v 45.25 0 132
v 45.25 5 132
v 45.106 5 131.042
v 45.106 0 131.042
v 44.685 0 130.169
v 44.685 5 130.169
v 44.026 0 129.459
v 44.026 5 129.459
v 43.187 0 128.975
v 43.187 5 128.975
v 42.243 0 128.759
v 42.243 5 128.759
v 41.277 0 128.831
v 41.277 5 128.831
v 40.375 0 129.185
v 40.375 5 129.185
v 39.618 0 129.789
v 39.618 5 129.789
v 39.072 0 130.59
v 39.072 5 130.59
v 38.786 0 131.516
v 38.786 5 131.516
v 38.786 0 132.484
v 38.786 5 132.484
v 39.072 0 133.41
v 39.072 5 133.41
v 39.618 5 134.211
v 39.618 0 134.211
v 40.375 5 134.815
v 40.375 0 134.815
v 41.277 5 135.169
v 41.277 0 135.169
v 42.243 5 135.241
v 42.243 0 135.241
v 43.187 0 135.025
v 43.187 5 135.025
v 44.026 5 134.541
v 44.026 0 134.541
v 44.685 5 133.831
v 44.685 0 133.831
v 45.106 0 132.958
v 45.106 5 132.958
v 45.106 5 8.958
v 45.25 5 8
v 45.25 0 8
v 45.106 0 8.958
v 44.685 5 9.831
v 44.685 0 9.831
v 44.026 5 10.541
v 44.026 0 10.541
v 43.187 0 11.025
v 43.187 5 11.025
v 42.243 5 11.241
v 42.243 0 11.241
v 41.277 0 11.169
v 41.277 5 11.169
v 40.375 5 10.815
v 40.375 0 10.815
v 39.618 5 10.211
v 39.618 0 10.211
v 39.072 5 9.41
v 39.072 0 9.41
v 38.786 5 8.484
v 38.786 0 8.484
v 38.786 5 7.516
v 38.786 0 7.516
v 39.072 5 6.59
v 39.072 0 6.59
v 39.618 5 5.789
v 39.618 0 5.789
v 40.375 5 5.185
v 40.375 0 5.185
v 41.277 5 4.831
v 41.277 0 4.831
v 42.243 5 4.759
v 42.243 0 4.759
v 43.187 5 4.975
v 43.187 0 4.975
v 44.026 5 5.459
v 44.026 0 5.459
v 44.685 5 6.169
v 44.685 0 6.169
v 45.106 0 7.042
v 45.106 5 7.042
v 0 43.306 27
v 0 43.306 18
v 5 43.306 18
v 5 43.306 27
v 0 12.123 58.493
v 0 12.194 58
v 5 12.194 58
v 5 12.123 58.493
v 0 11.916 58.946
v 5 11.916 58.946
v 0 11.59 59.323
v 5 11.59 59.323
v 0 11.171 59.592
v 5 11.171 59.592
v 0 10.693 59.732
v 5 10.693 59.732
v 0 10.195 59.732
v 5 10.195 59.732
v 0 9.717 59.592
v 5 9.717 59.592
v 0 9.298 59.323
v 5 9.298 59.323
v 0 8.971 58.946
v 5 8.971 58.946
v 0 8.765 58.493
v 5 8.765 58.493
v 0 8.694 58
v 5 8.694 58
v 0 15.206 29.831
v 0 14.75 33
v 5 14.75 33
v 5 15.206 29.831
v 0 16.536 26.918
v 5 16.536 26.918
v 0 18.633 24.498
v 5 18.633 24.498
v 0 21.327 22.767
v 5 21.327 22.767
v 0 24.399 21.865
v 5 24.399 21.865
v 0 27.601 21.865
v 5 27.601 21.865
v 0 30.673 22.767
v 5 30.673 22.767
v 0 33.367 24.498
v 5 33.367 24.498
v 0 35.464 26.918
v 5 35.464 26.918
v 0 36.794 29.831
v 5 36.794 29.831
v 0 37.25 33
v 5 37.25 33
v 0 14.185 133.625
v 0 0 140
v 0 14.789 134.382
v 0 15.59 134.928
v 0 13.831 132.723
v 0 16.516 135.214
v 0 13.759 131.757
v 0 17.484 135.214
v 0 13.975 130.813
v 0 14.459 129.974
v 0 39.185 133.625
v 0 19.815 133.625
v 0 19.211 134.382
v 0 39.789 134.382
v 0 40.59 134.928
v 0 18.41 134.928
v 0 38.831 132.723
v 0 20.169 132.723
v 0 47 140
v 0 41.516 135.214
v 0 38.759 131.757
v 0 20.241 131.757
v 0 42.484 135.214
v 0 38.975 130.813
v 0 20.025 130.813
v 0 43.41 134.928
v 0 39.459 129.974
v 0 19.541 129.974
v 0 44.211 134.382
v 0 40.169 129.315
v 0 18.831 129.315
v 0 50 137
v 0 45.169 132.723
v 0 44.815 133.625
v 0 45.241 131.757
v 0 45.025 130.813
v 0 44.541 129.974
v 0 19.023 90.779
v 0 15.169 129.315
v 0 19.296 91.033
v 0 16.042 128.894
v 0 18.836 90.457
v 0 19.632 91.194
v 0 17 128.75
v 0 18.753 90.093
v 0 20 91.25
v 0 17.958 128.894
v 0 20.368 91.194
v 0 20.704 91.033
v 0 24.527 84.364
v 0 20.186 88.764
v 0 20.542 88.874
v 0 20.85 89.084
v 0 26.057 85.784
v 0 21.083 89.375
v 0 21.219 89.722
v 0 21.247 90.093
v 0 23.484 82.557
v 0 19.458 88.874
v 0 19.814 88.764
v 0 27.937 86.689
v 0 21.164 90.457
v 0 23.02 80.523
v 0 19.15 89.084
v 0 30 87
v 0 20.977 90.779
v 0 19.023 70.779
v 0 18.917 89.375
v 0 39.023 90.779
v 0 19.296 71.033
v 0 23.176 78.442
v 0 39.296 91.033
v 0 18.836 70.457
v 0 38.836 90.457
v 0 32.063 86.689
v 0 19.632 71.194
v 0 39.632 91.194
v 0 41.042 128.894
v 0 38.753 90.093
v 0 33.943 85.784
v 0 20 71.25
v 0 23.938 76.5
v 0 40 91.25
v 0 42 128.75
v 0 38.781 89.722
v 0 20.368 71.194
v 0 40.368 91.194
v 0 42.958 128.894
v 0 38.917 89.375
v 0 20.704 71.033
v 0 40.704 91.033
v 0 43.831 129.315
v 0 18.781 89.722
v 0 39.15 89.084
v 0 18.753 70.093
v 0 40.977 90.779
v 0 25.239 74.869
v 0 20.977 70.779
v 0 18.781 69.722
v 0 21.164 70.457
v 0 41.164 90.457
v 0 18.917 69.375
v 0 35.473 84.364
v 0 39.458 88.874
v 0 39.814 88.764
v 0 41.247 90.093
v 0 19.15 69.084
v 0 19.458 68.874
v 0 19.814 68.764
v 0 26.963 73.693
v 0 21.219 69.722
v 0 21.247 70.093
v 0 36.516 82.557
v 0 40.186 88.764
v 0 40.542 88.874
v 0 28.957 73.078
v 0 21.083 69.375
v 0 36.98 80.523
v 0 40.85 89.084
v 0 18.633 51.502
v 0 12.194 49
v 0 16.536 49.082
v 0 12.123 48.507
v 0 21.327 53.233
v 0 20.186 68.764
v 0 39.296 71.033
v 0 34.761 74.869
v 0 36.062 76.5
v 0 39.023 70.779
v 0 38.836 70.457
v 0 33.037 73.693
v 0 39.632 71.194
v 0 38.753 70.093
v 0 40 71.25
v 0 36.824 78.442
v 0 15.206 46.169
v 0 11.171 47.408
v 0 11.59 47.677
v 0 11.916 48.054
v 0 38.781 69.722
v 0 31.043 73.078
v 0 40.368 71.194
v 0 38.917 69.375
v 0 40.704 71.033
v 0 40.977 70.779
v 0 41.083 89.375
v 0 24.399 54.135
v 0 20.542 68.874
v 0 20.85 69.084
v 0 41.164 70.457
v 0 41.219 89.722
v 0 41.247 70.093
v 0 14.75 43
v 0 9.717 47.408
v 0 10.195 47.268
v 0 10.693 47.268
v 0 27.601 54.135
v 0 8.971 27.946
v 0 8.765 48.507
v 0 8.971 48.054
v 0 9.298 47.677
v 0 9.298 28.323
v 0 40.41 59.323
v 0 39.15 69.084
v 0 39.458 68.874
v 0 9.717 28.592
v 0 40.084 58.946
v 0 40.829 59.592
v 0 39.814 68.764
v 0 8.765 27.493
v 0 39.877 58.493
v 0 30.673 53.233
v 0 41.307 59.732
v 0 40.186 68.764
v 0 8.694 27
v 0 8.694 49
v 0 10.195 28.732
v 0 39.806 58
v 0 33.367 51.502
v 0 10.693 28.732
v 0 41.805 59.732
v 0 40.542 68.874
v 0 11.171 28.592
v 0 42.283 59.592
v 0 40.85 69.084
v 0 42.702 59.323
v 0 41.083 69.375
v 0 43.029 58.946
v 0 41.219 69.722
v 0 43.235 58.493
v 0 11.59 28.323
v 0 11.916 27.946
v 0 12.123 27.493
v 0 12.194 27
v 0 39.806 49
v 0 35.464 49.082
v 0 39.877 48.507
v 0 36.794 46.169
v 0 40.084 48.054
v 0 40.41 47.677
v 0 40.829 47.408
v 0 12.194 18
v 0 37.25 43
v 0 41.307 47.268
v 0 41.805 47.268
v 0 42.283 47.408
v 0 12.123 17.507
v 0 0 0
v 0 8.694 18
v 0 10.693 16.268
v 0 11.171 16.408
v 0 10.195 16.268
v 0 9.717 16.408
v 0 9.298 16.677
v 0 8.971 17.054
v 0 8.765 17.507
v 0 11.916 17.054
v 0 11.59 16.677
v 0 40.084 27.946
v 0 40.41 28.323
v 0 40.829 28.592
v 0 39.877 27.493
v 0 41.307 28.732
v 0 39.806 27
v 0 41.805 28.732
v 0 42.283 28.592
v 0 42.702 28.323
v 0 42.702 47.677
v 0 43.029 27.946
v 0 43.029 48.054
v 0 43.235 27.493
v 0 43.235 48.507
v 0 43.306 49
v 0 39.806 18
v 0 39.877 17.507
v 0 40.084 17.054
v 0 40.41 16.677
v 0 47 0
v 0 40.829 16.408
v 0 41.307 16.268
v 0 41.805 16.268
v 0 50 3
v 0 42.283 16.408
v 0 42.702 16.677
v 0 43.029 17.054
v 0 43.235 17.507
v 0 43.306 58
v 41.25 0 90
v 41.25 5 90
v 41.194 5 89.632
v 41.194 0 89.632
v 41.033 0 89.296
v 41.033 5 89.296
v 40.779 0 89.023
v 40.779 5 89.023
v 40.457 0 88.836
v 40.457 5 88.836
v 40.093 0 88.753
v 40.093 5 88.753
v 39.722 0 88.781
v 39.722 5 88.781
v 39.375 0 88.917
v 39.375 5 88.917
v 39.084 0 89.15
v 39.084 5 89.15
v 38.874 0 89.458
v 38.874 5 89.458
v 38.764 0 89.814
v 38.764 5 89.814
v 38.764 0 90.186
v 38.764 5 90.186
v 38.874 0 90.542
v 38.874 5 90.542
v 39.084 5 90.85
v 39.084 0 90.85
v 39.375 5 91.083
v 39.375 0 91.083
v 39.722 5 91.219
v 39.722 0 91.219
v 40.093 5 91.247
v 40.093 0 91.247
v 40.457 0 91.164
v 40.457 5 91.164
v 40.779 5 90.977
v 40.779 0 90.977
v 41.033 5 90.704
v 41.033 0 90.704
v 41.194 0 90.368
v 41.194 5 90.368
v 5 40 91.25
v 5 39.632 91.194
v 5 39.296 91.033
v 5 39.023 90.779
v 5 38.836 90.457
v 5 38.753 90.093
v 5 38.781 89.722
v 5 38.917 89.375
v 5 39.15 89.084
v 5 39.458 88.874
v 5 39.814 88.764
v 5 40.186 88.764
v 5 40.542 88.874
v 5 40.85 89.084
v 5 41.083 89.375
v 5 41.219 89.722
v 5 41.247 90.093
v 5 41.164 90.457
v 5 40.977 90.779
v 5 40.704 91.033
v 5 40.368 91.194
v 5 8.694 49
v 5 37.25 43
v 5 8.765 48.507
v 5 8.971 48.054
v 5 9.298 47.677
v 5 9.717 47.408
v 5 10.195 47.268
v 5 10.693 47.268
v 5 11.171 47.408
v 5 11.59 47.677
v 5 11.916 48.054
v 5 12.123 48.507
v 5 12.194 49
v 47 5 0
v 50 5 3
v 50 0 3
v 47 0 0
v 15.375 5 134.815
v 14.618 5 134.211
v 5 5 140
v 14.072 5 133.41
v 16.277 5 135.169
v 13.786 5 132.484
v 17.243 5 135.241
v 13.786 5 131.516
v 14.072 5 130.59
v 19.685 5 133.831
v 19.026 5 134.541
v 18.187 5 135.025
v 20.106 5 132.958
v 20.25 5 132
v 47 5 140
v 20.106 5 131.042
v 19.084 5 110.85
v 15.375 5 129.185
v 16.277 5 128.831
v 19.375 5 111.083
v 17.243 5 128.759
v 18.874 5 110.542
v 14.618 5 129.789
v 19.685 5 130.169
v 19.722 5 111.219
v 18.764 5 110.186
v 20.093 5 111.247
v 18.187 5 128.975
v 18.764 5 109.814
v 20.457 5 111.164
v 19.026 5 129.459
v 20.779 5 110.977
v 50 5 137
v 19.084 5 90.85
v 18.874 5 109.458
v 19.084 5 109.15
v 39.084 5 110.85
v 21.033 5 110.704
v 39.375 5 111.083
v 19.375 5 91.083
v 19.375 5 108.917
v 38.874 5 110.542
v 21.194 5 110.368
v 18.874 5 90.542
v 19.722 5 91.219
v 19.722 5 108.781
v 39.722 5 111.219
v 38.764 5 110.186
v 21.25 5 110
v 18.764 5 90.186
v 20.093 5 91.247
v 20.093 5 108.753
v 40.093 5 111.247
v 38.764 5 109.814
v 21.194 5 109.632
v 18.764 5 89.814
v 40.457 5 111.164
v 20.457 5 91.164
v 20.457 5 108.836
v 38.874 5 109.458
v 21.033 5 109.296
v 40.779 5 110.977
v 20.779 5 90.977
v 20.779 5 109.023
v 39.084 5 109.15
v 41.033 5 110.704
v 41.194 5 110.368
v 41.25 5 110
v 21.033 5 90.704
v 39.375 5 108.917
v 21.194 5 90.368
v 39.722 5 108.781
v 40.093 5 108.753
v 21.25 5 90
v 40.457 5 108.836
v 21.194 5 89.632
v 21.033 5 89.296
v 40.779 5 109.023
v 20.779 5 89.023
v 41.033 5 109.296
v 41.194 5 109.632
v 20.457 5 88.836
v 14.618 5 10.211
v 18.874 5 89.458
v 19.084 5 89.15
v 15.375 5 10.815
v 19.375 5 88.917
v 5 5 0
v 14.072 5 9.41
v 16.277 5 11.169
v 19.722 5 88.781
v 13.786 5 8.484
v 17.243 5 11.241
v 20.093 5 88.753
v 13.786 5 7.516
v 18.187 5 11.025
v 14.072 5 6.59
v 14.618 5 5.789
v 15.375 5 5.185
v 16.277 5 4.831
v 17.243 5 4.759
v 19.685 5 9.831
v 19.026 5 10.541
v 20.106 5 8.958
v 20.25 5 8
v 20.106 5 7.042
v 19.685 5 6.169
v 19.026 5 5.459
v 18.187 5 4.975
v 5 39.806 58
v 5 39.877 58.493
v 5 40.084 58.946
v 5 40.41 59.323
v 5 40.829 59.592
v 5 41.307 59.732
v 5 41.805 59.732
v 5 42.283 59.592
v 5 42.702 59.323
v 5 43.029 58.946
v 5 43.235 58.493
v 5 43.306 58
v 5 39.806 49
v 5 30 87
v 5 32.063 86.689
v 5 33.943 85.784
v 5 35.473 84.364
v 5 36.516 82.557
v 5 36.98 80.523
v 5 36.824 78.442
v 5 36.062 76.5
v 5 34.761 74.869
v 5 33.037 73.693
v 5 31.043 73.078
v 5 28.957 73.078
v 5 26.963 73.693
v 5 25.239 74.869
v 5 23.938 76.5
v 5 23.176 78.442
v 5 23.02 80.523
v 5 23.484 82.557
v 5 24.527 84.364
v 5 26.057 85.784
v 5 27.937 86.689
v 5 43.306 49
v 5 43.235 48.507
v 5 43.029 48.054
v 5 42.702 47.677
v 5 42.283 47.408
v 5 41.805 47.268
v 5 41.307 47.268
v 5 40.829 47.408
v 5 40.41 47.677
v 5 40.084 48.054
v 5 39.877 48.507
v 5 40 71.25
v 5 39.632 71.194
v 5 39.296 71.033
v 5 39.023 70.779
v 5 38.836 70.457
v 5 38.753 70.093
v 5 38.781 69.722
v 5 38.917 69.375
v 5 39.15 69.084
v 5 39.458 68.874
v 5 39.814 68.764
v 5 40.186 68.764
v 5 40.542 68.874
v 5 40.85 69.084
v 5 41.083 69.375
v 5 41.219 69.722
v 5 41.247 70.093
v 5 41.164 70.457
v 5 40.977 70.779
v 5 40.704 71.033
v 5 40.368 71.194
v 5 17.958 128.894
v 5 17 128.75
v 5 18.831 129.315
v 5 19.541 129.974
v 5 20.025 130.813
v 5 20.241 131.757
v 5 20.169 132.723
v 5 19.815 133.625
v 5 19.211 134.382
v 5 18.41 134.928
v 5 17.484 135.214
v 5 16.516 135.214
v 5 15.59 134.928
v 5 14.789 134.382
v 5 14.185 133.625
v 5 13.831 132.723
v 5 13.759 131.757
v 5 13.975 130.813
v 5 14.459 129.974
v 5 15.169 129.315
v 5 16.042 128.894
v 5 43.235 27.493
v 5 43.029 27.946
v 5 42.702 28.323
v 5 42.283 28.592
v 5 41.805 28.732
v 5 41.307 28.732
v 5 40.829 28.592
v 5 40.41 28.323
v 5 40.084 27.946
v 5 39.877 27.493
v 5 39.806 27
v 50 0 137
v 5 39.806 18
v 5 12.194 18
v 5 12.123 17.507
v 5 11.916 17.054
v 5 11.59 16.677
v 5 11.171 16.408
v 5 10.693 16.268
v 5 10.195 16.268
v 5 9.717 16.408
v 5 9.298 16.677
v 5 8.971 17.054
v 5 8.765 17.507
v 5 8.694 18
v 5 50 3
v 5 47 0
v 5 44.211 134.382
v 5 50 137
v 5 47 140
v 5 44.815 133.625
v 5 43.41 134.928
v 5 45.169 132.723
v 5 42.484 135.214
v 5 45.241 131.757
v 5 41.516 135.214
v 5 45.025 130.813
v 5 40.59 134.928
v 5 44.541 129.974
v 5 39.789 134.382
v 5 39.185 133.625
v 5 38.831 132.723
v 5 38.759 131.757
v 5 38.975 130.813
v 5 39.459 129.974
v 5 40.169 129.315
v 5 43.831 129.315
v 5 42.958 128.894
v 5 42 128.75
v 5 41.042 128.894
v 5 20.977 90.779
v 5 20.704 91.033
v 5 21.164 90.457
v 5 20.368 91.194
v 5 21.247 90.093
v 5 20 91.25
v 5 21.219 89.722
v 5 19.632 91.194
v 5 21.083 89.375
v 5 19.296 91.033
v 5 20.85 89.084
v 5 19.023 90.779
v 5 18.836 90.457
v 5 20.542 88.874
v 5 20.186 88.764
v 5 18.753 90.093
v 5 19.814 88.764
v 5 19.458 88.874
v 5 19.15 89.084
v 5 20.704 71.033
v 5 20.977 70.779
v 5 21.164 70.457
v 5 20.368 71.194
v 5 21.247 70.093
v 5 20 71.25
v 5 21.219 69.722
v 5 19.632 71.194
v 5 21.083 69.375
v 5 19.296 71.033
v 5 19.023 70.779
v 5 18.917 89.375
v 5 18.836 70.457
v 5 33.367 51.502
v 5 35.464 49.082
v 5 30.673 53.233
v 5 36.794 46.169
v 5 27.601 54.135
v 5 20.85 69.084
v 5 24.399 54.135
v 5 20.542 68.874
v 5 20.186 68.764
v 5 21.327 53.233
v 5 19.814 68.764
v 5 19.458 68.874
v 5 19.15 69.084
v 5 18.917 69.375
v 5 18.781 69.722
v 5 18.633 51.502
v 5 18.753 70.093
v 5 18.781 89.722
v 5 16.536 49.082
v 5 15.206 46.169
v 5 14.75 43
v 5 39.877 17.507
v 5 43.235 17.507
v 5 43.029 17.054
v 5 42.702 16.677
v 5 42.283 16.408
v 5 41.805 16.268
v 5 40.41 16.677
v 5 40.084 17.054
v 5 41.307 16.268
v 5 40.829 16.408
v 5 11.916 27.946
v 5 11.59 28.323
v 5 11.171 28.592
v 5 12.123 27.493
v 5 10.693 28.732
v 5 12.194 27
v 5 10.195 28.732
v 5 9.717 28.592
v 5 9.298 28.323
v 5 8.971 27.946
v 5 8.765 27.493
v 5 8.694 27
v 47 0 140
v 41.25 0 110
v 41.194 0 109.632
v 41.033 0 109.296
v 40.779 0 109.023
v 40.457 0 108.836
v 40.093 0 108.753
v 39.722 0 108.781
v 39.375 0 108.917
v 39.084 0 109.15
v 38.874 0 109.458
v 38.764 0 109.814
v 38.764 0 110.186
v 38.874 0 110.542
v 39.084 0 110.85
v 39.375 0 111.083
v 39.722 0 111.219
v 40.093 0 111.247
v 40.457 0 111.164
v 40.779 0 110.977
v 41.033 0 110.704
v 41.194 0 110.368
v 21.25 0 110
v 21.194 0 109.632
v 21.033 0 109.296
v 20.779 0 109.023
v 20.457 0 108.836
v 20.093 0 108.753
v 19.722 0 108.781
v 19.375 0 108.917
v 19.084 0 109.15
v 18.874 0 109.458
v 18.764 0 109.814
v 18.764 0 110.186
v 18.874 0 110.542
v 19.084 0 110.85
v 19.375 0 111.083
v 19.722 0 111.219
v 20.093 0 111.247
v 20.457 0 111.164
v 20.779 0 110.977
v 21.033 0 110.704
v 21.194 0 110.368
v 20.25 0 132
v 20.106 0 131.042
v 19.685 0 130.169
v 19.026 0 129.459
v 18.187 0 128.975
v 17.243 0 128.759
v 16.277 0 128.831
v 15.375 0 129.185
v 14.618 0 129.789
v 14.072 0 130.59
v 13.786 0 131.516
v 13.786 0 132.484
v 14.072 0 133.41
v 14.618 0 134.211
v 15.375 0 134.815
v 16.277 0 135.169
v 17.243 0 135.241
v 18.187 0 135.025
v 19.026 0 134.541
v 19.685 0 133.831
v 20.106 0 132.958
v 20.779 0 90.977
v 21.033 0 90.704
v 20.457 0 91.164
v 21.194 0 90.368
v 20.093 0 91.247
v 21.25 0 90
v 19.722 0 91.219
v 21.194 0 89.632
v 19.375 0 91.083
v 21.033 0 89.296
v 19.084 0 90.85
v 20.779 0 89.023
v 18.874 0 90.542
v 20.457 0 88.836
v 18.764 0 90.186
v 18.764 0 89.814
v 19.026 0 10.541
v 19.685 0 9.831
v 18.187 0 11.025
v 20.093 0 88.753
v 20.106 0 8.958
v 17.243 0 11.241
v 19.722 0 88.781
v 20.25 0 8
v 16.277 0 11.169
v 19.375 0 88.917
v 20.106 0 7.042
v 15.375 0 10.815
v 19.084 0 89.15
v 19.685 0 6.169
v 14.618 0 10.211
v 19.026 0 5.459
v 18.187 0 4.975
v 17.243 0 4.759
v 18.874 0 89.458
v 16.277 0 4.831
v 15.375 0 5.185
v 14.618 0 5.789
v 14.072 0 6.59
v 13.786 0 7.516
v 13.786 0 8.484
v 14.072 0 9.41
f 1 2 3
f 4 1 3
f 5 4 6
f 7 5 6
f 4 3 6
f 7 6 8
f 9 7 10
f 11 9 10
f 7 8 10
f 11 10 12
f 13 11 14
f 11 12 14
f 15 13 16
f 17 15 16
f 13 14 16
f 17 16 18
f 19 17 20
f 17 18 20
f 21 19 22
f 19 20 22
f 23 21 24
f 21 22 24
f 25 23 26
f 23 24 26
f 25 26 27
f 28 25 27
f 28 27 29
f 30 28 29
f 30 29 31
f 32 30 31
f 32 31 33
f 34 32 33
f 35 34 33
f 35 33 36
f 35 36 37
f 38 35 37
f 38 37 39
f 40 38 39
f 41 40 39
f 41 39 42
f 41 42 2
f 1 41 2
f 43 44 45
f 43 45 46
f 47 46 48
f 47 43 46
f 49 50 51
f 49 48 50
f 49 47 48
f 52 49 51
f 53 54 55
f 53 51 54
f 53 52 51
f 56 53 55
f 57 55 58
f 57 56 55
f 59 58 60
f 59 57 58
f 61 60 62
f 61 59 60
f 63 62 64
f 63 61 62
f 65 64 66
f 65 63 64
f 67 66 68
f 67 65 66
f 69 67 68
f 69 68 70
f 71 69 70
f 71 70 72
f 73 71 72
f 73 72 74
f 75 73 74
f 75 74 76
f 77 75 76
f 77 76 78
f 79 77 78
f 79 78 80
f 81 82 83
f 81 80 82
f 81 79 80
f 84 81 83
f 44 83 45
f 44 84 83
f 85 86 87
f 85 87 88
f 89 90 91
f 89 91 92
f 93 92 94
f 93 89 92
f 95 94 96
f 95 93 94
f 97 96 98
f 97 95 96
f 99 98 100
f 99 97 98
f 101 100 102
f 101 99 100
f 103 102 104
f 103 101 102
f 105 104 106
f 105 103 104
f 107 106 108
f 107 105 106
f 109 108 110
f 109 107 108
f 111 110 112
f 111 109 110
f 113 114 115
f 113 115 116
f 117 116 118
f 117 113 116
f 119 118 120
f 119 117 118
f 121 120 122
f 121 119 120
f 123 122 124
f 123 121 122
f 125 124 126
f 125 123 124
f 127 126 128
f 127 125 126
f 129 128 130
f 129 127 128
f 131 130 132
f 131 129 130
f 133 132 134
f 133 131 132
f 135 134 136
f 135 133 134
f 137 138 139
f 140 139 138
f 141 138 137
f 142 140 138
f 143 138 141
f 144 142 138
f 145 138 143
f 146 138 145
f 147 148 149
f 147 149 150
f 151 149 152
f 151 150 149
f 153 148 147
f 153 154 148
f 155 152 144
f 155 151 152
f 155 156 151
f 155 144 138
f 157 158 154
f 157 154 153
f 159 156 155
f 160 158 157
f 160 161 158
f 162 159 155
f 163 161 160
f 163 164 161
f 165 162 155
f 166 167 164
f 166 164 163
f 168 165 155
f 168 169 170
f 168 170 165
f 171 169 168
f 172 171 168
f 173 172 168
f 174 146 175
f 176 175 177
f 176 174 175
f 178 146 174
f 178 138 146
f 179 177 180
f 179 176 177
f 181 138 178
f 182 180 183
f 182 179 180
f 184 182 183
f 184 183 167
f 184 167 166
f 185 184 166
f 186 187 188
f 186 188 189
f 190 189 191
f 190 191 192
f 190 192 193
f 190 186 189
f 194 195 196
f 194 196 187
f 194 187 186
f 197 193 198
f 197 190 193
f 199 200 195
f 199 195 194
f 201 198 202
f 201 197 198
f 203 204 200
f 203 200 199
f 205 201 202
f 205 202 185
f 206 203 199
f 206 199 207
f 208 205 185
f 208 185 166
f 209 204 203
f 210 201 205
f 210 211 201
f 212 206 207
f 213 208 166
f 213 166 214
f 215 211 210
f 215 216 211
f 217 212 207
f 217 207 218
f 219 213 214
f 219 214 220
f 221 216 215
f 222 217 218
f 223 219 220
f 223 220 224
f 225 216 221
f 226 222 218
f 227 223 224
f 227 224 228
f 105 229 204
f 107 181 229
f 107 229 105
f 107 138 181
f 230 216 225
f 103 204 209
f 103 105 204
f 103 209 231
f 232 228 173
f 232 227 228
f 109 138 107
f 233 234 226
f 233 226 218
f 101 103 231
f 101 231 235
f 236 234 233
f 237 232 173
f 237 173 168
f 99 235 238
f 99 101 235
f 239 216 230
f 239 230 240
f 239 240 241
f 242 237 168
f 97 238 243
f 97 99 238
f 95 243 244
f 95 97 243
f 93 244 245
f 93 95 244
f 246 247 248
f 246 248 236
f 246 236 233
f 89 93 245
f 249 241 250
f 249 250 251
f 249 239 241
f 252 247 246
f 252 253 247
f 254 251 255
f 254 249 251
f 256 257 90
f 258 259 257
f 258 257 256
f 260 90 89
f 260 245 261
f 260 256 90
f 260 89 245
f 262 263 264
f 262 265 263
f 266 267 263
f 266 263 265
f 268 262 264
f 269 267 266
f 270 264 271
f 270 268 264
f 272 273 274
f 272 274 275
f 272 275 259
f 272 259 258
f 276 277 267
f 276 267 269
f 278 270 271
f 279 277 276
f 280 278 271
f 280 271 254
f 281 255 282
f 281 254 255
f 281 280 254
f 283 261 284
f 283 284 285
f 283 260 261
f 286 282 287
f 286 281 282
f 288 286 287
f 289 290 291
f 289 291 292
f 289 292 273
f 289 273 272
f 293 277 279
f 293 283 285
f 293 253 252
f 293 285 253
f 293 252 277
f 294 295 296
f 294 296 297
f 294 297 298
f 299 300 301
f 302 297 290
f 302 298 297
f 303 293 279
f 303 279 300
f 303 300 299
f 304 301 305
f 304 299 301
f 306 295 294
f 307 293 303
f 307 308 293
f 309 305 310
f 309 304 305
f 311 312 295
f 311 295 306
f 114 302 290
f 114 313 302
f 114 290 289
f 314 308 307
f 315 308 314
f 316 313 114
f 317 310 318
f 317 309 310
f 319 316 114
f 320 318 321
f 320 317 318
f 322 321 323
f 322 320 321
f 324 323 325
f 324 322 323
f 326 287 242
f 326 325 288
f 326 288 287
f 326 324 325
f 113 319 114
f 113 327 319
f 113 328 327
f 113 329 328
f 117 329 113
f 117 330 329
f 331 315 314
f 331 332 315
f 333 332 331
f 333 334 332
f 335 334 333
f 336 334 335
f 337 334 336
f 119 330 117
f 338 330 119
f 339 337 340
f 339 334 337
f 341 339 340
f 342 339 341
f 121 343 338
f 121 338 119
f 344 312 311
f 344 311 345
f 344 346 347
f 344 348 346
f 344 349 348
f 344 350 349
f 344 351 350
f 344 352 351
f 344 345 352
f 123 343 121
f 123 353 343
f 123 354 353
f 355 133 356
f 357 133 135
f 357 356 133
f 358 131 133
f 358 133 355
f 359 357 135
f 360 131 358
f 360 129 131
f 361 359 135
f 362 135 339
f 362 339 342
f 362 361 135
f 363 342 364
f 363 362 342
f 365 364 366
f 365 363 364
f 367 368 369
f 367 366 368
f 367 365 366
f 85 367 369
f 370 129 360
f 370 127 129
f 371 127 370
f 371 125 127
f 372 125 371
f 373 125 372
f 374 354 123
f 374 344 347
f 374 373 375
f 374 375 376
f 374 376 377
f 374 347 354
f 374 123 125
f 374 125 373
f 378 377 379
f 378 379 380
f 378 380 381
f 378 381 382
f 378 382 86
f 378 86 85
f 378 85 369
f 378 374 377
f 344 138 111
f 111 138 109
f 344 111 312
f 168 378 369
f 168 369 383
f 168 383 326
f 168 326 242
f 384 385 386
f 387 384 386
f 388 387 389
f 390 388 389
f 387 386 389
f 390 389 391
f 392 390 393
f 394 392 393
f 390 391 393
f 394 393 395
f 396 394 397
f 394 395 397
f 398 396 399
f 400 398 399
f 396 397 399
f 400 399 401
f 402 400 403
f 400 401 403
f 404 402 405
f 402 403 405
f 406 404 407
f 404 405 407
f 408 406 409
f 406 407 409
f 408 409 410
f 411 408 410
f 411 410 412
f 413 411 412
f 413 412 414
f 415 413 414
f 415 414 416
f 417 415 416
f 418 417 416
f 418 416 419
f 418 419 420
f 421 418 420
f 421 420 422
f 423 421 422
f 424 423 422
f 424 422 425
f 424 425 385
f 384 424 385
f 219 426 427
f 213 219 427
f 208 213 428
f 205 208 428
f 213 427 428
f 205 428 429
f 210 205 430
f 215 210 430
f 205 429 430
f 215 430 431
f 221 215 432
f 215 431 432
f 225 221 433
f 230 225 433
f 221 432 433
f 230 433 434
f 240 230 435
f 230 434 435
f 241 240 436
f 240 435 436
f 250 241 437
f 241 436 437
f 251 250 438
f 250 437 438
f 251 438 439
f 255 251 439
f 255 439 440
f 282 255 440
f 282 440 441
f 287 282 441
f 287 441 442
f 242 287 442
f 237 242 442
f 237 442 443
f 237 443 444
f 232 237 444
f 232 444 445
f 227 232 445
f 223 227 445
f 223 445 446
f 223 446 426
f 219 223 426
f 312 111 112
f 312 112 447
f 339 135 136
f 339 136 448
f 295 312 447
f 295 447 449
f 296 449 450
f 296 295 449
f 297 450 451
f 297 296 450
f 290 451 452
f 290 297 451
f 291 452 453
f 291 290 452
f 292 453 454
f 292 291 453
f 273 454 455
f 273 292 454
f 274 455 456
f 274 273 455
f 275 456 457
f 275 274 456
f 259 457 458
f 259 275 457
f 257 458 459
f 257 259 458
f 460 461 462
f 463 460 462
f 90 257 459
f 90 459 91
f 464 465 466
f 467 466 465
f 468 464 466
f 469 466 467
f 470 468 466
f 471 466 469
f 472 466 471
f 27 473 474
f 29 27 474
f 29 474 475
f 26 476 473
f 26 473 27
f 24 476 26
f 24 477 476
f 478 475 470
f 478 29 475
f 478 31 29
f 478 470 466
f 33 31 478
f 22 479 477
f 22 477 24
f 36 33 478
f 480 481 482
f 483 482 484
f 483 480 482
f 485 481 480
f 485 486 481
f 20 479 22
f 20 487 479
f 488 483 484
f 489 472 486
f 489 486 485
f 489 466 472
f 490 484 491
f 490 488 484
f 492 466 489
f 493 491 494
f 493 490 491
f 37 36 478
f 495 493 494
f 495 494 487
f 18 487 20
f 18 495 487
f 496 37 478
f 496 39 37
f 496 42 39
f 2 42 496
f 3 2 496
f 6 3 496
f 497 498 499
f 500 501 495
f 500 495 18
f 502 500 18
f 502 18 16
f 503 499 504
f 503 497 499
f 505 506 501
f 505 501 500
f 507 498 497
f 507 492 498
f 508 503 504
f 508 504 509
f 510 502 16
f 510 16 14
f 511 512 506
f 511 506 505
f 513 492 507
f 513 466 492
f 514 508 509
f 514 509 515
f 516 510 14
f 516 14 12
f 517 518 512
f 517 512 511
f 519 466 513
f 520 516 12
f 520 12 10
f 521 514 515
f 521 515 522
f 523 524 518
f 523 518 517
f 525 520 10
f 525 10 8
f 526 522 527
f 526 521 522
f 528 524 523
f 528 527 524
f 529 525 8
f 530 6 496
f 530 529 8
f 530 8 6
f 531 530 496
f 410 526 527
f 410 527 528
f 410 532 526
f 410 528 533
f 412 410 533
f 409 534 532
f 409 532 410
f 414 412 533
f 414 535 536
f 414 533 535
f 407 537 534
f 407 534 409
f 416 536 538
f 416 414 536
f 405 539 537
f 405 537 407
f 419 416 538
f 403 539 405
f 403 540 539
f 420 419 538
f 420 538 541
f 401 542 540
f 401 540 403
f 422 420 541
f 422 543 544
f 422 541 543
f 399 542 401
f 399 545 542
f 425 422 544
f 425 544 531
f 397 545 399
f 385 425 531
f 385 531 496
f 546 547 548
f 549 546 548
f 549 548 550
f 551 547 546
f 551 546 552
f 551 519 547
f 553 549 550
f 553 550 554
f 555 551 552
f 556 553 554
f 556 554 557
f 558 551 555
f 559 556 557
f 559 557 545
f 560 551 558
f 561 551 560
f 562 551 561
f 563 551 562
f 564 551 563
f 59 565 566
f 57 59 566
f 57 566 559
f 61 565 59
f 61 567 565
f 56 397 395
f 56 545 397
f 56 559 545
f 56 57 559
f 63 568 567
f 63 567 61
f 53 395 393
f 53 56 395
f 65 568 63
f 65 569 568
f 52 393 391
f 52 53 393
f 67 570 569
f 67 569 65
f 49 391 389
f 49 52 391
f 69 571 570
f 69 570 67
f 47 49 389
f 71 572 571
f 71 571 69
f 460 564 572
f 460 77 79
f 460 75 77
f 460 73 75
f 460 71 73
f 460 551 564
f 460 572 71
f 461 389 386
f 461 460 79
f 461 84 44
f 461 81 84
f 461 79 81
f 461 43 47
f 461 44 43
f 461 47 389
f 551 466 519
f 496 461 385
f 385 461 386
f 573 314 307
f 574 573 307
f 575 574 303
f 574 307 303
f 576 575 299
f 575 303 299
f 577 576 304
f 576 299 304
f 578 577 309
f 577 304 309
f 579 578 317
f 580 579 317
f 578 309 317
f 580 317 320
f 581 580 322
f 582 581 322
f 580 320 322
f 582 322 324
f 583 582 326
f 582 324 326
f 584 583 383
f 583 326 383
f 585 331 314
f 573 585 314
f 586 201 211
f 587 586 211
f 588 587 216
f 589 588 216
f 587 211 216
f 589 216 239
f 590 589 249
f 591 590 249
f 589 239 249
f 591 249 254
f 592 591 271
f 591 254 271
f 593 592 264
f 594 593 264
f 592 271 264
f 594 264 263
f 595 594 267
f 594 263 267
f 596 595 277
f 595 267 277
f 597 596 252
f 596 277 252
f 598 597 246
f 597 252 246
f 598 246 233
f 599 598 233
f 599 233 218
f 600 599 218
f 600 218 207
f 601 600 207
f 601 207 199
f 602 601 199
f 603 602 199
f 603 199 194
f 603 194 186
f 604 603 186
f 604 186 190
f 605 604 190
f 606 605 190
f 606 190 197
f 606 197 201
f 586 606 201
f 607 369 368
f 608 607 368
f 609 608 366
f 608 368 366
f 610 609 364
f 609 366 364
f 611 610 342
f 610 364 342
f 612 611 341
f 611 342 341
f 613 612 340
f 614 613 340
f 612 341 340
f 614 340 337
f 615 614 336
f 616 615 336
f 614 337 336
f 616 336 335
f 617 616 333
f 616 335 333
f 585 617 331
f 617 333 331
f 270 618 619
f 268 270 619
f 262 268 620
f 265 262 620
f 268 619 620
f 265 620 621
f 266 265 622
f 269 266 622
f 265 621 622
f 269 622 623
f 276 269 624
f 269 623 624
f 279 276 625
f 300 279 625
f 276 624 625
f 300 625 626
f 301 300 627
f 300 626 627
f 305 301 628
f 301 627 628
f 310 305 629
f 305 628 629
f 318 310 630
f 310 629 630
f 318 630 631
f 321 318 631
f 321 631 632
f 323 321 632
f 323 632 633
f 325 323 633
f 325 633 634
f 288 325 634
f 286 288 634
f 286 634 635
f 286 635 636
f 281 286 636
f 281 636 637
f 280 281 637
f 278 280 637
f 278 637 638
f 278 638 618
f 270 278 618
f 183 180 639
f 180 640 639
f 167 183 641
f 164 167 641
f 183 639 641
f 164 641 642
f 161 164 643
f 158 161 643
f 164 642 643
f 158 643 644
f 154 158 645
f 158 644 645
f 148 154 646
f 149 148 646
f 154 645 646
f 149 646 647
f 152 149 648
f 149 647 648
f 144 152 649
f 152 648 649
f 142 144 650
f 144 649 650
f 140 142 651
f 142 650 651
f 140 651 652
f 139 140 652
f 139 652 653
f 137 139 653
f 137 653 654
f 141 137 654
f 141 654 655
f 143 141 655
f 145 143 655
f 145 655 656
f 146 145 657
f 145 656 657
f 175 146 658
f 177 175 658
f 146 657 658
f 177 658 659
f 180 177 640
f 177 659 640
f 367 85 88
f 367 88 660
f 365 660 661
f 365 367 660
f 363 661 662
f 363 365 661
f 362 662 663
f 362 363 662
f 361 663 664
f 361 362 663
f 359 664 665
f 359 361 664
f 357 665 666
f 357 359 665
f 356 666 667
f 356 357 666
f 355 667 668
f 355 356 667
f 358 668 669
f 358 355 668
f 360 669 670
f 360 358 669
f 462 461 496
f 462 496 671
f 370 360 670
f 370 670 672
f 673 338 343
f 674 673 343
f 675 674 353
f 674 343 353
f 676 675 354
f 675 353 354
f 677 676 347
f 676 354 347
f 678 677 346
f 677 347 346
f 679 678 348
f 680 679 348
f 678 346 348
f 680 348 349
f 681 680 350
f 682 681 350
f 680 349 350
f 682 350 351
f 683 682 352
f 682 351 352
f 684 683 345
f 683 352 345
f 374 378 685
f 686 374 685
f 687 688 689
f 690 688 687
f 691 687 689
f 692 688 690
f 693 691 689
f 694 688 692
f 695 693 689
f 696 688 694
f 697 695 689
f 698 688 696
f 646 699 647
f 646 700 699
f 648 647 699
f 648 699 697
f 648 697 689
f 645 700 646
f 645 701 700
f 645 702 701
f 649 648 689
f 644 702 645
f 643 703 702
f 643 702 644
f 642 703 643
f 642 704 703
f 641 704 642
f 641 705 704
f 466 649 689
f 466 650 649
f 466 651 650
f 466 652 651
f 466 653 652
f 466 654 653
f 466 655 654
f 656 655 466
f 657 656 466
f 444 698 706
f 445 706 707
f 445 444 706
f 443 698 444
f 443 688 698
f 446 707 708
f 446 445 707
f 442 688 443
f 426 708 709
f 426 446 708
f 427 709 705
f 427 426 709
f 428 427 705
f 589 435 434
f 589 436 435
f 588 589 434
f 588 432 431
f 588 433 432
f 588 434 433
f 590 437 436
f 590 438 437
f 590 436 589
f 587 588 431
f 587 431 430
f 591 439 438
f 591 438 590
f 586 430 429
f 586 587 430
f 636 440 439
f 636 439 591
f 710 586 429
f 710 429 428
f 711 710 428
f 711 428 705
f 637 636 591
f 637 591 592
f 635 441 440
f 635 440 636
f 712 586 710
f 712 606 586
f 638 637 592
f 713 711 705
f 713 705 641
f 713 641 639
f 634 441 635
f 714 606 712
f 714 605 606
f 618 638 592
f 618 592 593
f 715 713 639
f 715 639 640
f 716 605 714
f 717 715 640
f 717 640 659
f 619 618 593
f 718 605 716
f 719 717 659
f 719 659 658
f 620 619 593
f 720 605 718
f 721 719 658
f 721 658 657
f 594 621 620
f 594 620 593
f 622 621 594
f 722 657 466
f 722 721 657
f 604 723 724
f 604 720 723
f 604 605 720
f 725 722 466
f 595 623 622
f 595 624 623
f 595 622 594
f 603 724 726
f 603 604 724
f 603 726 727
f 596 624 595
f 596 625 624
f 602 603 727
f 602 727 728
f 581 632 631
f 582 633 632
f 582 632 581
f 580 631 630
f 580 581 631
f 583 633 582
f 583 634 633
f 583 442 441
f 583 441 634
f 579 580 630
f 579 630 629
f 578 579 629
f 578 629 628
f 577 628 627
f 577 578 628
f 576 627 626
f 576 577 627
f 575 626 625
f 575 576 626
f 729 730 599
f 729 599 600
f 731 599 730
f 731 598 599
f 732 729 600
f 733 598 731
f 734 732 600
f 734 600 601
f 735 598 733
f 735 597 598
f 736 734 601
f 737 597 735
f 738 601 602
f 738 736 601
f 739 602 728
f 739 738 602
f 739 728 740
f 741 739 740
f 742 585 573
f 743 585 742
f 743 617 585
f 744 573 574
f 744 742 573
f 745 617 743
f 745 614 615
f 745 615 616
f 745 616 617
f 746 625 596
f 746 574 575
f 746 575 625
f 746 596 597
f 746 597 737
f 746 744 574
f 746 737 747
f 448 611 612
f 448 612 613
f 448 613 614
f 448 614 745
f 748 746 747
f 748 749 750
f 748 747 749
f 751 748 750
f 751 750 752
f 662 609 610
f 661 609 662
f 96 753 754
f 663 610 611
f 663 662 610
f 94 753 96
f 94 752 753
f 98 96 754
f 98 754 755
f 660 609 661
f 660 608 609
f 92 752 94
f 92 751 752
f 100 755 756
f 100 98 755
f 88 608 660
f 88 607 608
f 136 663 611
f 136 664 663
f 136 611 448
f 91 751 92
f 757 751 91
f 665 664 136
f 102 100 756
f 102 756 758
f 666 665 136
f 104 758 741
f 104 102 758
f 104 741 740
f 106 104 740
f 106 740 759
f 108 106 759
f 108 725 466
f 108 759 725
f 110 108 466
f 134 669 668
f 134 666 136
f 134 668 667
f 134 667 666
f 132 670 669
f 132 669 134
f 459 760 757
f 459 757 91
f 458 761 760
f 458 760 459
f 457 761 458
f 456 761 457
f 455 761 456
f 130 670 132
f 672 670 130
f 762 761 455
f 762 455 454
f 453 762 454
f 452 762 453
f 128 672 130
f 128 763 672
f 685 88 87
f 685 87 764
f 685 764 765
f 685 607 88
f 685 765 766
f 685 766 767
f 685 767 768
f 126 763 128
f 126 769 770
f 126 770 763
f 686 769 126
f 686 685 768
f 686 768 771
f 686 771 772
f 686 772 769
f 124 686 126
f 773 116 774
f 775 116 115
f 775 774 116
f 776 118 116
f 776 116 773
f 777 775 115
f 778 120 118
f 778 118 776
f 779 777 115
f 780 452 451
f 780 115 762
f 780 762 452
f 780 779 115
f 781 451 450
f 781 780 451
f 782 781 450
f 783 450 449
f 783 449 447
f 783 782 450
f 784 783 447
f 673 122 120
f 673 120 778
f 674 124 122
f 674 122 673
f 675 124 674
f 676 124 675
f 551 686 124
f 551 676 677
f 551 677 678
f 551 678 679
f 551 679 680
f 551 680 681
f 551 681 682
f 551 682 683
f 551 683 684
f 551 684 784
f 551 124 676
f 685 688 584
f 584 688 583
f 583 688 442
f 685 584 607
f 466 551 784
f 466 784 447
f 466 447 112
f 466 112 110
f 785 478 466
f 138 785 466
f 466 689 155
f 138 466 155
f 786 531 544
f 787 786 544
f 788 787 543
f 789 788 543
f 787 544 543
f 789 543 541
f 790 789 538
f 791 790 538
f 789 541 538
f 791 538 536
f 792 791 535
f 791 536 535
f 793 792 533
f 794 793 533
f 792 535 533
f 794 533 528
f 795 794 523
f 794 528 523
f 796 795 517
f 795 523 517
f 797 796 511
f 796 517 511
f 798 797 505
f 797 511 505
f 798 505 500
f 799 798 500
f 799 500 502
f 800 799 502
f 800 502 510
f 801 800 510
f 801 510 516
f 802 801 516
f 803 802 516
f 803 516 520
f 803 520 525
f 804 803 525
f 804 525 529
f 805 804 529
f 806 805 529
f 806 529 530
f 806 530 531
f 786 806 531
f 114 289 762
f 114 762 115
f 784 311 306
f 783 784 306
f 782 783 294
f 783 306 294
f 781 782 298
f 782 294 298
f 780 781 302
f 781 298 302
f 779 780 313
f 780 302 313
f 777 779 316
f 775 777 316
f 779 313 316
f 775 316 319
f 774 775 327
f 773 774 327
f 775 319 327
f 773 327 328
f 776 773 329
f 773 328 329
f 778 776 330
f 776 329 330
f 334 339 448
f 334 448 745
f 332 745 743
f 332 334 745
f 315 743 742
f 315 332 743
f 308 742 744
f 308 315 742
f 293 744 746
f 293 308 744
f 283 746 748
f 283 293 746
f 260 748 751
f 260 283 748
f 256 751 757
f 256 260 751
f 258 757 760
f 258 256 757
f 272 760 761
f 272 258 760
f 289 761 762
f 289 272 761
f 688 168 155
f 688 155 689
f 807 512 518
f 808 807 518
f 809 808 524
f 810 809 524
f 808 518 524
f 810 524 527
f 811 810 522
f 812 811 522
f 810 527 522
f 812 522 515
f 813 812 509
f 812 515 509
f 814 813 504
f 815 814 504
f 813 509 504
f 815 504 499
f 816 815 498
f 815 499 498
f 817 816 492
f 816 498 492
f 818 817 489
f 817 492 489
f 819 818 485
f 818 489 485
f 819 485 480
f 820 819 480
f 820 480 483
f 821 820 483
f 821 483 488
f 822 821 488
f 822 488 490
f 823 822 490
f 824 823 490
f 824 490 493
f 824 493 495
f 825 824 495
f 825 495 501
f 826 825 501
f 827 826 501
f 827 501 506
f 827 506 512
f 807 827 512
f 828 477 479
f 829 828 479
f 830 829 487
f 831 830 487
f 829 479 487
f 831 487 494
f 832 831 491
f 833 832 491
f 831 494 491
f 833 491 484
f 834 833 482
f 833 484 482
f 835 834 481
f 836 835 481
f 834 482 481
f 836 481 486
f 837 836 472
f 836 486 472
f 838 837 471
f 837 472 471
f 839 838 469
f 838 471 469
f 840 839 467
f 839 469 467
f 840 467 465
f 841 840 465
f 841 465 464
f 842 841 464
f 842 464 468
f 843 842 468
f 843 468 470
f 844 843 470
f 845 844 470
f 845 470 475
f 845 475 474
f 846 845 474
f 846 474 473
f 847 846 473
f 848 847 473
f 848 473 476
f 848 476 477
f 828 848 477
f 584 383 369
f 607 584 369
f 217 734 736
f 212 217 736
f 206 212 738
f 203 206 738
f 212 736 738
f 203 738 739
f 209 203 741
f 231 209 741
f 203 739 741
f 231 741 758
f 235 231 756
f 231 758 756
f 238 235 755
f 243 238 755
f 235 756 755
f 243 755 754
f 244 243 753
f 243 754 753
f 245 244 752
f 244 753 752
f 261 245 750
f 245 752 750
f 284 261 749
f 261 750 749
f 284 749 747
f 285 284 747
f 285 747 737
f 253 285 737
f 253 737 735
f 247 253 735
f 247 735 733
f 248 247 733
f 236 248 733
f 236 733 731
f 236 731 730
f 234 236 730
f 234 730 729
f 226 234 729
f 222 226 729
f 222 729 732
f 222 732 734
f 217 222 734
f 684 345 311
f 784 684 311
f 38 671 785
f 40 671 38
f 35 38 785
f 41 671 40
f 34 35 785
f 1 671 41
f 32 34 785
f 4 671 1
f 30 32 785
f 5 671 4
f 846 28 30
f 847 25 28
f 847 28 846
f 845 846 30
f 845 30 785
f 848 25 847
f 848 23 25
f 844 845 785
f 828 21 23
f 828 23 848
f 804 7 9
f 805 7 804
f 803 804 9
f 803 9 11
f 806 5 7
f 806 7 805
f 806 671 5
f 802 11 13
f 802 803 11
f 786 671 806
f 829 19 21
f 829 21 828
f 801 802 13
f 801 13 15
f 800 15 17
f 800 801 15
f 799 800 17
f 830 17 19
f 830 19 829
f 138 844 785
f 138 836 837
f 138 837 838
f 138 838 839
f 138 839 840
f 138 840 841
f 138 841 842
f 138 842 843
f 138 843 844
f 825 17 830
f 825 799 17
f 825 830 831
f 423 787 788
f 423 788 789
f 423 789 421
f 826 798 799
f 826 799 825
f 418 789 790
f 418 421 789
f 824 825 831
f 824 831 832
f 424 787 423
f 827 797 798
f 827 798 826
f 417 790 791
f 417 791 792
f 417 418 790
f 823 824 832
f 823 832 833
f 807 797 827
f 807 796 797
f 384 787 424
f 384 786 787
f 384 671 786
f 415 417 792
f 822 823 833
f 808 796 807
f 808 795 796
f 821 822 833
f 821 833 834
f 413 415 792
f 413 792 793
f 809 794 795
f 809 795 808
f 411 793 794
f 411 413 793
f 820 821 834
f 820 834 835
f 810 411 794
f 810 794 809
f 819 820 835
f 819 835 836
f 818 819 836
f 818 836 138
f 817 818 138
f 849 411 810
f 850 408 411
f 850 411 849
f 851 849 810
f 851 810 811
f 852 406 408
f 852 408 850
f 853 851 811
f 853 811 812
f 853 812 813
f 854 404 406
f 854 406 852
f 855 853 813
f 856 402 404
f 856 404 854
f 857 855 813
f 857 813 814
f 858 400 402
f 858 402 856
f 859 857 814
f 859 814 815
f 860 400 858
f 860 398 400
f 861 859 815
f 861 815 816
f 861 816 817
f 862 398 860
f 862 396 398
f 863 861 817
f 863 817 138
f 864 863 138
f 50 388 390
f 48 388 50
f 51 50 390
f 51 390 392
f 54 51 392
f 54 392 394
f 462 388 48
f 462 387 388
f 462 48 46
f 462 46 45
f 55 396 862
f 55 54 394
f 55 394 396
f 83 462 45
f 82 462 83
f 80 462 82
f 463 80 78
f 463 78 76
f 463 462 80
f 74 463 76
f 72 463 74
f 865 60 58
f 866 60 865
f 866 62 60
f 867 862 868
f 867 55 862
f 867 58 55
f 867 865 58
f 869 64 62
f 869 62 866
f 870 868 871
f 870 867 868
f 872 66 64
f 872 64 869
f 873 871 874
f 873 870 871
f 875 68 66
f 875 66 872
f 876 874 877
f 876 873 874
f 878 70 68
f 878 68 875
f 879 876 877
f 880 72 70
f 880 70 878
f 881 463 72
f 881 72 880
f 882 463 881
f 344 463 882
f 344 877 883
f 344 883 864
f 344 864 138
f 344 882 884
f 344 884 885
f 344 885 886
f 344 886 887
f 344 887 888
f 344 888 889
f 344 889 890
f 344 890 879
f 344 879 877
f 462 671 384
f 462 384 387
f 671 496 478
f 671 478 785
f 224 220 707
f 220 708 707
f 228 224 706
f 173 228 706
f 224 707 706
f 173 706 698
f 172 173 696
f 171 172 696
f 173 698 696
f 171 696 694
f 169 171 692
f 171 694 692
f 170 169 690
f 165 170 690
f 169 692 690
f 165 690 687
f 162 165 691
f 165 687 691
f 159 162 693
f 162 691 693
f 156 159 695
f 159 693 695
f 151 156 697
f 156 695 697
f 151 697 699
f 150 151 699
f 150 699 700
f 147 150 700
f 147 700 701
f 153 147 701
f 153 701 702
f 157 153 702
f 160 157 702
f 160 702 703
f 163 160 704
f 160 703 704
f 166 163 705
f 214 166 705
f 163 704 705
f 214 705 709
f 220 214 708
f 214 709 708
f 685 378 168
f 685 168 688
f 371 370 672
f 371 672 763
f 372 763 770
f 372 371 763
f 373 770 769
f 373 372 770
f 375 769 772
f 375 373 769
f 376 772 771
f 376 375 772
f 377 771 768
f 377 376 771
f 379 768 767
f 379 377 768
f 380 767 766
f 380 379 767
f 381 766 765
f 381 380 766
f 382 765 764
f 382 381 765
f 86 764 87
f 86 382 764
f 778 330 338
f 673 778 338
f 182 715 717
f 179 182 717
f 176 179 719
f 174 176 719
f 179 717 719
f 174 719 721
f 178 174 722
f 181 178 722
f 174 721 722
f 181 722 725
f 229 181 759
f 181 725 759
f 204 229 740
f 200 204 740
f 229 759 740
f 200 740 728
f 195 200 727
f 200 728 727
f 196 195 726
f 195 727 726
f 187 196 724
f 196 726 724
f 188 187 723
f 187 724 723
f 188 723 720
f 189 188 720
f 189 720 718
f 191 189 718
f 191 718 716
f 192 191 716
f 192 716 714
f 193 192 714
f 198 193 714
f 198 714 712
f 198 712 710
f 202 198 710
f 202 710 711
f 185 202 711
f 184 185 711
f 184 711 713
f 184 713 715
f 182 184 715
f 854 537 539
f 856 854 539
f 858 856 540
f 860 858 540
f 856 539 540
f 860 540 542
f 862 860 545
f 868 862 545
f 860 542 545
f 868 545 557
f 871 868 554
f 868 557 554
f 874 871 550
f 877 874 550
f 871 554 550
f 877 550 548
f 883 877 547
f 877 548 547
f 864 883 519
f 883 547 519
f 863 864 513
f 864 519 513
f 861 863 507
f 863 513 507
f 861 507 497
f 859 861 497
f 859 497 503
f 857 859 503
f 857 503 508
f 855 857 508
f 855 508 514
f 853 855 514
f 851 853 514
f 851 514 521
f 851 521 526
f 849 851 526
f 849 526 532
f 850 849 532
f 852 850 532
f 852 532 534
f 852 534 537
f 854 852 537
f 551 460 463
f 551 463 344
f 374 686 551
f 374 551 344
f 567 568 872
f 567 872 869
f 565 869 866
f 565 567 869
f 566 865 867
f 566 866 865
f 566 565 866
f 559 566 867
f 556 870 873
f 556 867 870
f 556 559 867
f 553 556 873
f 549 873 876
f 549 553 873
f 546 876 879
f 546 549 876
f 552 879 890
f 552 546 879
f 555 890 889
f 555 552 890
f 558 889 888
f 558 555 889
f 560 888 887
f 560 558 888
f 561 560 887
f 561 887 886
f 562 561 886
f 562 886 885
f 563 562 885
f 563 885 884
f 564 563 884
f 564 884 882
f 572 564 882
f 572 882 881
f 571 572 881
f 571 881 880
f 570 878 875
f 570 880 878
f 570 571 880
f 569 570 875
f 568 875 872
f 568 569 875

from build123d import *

# Parameters (mm, degrees)
ESTRUSIONE_ESTRUSIONE1_DEPTH = 140
FORO_6_5_6_5_1_D             = 6.5
FORO_6_5_6_5_2_D             = 6.5
FORO_6_5_6_5_2_DEPTH         = 5
FORO_6_5_6_5_2_TIP           = 1.952797012
TAGLIO_ESTRUSIONE3_REACH     = 158.844
SCHIZZO10_R                  = 7
TAGLIO_ESTRUSIONE6_REACH     = 158.844
SMUSSO1_SIZE                 = 3
M3_TAPPED_HOLE1_D            = 2.5
M3_TAPPED_HOLE2_D            = 2.5


with BuildPart() as part:
    # Schizzo1 → Estrusione-Estrusione1 (new body)
    with BuildSketch(Plane.XY):
        Polygon((0, 0), (0, 50), (5, 50), (5, 5), (50, 5), (50, 0), align=None)
    extrude(amount=ESTRUSIONE_ESTRUSIONE1_DEPTH)

    # Foro Ø6.5 (6.5)-1 (through all)
    with Locations(Plane(origin=(0, 0, 0), x_dir=(-1, 0, 0), z_dir=(0, -1, 0))):
        with Locations((-17, -132), (-42, -132)):
            foro_6_5_6_5_1 = Hole(FORO_6_5_6_5_1_D / 2)

    # Foro Ø6.5 (6.5)-2
    with Locations(Plane.ZY):
        with Locations((132, 42), (132, 17)):
            Hole(FORO_6_5_6_5_2_D / 2, depth=FORO_6_5_6_5_2_DEPTH)
            with Locations((0, 0, -(FORO_6_5_6_5_2_DEPTH + FORO_6_5_6_5_2_TIP / 2))):  # 118° drill point
                Cone(0, FORO_6_5_6_5_2_D / 2, FORO_6_5_6_5_2_TIP, mode=Mode.SUBTRACT)

    # Specchia1: Foro Ø6.5 (6.5)-1 across plane
    add(foro_6_5_6_5_1.mirror(Plane.XY.offset(70)), mode=Mode.SUBTRACT)

    # Schizzo10 → Taglio-Estrusione3 (cut, up to next)
    with BuildSketch(Plane.ZY, mode=Mode.PRIVATE) as taglio_estrusione3_sk1:
        with Locations((80, 30)):
            Circle(SCHIZZO10_R)
    taglio_estrusione3_tool1 = extrude(taglio_estrusione3_sk1.sketch, amount=-TAGLIO_ESTRUSIONE3_REACH, mode=Mode.PRIVATE) & part.part
    add(taglio_estrusione3_tool1.solids().sort_by_distance((0, 30, 80))[0], mode=Mode.SUBTRACT)

    # Schizzo13 → Taglio-Estrusione6 (cut, up to next)
    with BuildSketch(Plane.ZY, mode=Mode.PRIVATE) as taglio_estrusione6_sk1:
        with BuildLine():
            Line((18, 43.306349186), (27, 43.306349186))
            ThreePointArc((27, 43.306349186), (28.75, 41.556349186), (27, 39.806349186))
            Line((27, 39.806349186), (18, 39.806349186))
            ThreePointArc((18, 39.806349186), (16.25, 41.556349186), (18, 43.306349186))
        make_face()
    taglio_estrusione6_tool1 = extrude(taglio_estrusione6_sk1.sketch, amount=-TAGLIO_ESTRUSIONE6_REACH, mode=Mode.PRIVATE) & part.part
    # Schizzo13 → Taglio-Estrusione6 (cut, up to next)
    with BuildSketch(Plane.ZY, mode=Mode.PRIVATE) as taglio_estrusione6_sk2:
        with BuildLine():
            Line((18, 8.693650814), (27, 8.693650814))
            ThreePointArc((27, 8.693650814), (28.75, 10.443650814), (27, 12.193650814))
            Line((27, 12.193650814), (18, 12.193650814))
            ThreePointArc((18, 12.193650814), (16.25, 10.443650814), (18, 8.693650814))
        make_face()
    taglio_estrusione6_tool2 = extrude(taglio_estrusione6_sk2.sketch, amount=-TAGLIO_ESTRUSIONE6_REACH, mode=Mode.PRIVATE) & part.part
    # Schizzo13 → Taglio-Estrusione6 (cut, up to next)
    with BuildSketch(Plane.ZY, mode=Mode.PRIVATE) as taglio_estrusione6_sk3:
        with BuildLine():
            Line((58, 43.306349186), (49, 43.306349186))
            ThreePointArc((49, 43.306349186), (47.25, 41.556349186), (49, 39.806349186))
            Line((49, 39.806349186), (58, 39.806349186))
            ThreePointArc((58, 39.806349186), (59.75, 41.556349186), (58, 43.306349186))
        make_face()
    taglio_estrusione6_tool3 = extrude(taglio_estrusione6_sk3.sketch, amount=-TAGLIO_ESTRUSIONE6_REACH, mode=Mode.PRIVATE) & part.part
    # Schizzo13 → Taglio-Estrusione6 (cut, up to next)
    with BuildSketch(Plane.ZY, mode=Mode.PRIVATE) as taglio_estrusione6_sk4:
        with BuildLine():
            Line((58, 8.693650814), (49, 8.693650814))
            ThreePointArc((49, 8.693650814), (47.25, 10.443650814), (49, 12.193650814))
            Line((49, 12.193650814), (58, 12.193650814))
            ThreePointArc((58, 12.193650814), (59.75, 10.443650814), (58, 8.693650814))
        make_face()
    taglio_estrusione6_tool4 = extrude(taglio_estrusione6_sk4.sketch, amount=-TAGLIO_ESTRUSIONE6_REACH, mode=Mode.PRIVATE) & part.part
    # Schizzo13 → Taglio-Estrusione6 (cut, up to next)
    with BuildSketch(Plane.ZY, mode=Mode.PRIVATE) as taglio_estrusione6_sk5:
        with BuildLine():
            Line((43, 14.75), (33, 14.75))
            ThreePointArc((33, 14.75), (21.75, 26), (33, 37.25))
            Line((33, 37.25), (43, 37.25))
            ThreePointArc((43, 37.25), (54.25, 26), (43, 14.75))
        make_face()
    taglio_estrusione6_tool5 = extrude(taglio_estrusione6_sk5.sketch, amount=-TAGLIO_ESTRUSIONE6_REACH, mode=Mode.PRIVATE) & part.part
    add(taglio_estrusione6_tool1.solids().sort_by_distance((0, 41.556349, 22.5))[0], mode=Mode.SUBTRACT)
    add(taglio_estrusione6_tool2.solids().sort_by_distance((0, 10.443651, 22.5))[0], mode=Mode.SUBTRACT)
    add(taglio_estrusione6_tool3.solids().sort_by_distance((0, 41.556349, 53.5))[0], mode=Mode.SUBTRACT)
    add(taglio_estrusione6_tool4.solids().sort_by_distance((0, 10.443651, 53.5))[0], mode=Mode.SUBTRACT)
    add(taglio_estrusione6_tool5.solids().sort_by_distance((0, 26, 38))[0], mode=Mode.SUBTRACT)

    # Smusso1
    smusso1_edges = [part.edges().sort_by_distance(p)[0] for p in [
        (2.5, 50, 140),
        (2.5, 50, 0),
        (50, 2.5, 140),
        (50, 2.5, 0),
    ]]
    chamfer(smusso1_edges, length=SMUSSO1_SIZE)

    # M3 Tapped Hole1 (through all)
    with Locations(Plane(origin=(0, 40, 70), x_dir=(0, 0, -1), z_dir=(-1, 0, 0))):
        with Locations((0, 0), (-20, 0), (-20, 20), (0, 20)):
            Hole(M3_TAPPED_HOLE1_D / 2)

    # M3 Tapped Hole2 (through all)
    with Locations(Plane(origin=(20, 0, 110), x_dir=(-1, 0, 0), z_dir=(0, -1, 0))):
        with Locations((0, 0), (-20, 0), (-20, 20), (0, 20)):
            Hole(M3_TAPPED_HOLE2_D / 2)


solid = part.part
